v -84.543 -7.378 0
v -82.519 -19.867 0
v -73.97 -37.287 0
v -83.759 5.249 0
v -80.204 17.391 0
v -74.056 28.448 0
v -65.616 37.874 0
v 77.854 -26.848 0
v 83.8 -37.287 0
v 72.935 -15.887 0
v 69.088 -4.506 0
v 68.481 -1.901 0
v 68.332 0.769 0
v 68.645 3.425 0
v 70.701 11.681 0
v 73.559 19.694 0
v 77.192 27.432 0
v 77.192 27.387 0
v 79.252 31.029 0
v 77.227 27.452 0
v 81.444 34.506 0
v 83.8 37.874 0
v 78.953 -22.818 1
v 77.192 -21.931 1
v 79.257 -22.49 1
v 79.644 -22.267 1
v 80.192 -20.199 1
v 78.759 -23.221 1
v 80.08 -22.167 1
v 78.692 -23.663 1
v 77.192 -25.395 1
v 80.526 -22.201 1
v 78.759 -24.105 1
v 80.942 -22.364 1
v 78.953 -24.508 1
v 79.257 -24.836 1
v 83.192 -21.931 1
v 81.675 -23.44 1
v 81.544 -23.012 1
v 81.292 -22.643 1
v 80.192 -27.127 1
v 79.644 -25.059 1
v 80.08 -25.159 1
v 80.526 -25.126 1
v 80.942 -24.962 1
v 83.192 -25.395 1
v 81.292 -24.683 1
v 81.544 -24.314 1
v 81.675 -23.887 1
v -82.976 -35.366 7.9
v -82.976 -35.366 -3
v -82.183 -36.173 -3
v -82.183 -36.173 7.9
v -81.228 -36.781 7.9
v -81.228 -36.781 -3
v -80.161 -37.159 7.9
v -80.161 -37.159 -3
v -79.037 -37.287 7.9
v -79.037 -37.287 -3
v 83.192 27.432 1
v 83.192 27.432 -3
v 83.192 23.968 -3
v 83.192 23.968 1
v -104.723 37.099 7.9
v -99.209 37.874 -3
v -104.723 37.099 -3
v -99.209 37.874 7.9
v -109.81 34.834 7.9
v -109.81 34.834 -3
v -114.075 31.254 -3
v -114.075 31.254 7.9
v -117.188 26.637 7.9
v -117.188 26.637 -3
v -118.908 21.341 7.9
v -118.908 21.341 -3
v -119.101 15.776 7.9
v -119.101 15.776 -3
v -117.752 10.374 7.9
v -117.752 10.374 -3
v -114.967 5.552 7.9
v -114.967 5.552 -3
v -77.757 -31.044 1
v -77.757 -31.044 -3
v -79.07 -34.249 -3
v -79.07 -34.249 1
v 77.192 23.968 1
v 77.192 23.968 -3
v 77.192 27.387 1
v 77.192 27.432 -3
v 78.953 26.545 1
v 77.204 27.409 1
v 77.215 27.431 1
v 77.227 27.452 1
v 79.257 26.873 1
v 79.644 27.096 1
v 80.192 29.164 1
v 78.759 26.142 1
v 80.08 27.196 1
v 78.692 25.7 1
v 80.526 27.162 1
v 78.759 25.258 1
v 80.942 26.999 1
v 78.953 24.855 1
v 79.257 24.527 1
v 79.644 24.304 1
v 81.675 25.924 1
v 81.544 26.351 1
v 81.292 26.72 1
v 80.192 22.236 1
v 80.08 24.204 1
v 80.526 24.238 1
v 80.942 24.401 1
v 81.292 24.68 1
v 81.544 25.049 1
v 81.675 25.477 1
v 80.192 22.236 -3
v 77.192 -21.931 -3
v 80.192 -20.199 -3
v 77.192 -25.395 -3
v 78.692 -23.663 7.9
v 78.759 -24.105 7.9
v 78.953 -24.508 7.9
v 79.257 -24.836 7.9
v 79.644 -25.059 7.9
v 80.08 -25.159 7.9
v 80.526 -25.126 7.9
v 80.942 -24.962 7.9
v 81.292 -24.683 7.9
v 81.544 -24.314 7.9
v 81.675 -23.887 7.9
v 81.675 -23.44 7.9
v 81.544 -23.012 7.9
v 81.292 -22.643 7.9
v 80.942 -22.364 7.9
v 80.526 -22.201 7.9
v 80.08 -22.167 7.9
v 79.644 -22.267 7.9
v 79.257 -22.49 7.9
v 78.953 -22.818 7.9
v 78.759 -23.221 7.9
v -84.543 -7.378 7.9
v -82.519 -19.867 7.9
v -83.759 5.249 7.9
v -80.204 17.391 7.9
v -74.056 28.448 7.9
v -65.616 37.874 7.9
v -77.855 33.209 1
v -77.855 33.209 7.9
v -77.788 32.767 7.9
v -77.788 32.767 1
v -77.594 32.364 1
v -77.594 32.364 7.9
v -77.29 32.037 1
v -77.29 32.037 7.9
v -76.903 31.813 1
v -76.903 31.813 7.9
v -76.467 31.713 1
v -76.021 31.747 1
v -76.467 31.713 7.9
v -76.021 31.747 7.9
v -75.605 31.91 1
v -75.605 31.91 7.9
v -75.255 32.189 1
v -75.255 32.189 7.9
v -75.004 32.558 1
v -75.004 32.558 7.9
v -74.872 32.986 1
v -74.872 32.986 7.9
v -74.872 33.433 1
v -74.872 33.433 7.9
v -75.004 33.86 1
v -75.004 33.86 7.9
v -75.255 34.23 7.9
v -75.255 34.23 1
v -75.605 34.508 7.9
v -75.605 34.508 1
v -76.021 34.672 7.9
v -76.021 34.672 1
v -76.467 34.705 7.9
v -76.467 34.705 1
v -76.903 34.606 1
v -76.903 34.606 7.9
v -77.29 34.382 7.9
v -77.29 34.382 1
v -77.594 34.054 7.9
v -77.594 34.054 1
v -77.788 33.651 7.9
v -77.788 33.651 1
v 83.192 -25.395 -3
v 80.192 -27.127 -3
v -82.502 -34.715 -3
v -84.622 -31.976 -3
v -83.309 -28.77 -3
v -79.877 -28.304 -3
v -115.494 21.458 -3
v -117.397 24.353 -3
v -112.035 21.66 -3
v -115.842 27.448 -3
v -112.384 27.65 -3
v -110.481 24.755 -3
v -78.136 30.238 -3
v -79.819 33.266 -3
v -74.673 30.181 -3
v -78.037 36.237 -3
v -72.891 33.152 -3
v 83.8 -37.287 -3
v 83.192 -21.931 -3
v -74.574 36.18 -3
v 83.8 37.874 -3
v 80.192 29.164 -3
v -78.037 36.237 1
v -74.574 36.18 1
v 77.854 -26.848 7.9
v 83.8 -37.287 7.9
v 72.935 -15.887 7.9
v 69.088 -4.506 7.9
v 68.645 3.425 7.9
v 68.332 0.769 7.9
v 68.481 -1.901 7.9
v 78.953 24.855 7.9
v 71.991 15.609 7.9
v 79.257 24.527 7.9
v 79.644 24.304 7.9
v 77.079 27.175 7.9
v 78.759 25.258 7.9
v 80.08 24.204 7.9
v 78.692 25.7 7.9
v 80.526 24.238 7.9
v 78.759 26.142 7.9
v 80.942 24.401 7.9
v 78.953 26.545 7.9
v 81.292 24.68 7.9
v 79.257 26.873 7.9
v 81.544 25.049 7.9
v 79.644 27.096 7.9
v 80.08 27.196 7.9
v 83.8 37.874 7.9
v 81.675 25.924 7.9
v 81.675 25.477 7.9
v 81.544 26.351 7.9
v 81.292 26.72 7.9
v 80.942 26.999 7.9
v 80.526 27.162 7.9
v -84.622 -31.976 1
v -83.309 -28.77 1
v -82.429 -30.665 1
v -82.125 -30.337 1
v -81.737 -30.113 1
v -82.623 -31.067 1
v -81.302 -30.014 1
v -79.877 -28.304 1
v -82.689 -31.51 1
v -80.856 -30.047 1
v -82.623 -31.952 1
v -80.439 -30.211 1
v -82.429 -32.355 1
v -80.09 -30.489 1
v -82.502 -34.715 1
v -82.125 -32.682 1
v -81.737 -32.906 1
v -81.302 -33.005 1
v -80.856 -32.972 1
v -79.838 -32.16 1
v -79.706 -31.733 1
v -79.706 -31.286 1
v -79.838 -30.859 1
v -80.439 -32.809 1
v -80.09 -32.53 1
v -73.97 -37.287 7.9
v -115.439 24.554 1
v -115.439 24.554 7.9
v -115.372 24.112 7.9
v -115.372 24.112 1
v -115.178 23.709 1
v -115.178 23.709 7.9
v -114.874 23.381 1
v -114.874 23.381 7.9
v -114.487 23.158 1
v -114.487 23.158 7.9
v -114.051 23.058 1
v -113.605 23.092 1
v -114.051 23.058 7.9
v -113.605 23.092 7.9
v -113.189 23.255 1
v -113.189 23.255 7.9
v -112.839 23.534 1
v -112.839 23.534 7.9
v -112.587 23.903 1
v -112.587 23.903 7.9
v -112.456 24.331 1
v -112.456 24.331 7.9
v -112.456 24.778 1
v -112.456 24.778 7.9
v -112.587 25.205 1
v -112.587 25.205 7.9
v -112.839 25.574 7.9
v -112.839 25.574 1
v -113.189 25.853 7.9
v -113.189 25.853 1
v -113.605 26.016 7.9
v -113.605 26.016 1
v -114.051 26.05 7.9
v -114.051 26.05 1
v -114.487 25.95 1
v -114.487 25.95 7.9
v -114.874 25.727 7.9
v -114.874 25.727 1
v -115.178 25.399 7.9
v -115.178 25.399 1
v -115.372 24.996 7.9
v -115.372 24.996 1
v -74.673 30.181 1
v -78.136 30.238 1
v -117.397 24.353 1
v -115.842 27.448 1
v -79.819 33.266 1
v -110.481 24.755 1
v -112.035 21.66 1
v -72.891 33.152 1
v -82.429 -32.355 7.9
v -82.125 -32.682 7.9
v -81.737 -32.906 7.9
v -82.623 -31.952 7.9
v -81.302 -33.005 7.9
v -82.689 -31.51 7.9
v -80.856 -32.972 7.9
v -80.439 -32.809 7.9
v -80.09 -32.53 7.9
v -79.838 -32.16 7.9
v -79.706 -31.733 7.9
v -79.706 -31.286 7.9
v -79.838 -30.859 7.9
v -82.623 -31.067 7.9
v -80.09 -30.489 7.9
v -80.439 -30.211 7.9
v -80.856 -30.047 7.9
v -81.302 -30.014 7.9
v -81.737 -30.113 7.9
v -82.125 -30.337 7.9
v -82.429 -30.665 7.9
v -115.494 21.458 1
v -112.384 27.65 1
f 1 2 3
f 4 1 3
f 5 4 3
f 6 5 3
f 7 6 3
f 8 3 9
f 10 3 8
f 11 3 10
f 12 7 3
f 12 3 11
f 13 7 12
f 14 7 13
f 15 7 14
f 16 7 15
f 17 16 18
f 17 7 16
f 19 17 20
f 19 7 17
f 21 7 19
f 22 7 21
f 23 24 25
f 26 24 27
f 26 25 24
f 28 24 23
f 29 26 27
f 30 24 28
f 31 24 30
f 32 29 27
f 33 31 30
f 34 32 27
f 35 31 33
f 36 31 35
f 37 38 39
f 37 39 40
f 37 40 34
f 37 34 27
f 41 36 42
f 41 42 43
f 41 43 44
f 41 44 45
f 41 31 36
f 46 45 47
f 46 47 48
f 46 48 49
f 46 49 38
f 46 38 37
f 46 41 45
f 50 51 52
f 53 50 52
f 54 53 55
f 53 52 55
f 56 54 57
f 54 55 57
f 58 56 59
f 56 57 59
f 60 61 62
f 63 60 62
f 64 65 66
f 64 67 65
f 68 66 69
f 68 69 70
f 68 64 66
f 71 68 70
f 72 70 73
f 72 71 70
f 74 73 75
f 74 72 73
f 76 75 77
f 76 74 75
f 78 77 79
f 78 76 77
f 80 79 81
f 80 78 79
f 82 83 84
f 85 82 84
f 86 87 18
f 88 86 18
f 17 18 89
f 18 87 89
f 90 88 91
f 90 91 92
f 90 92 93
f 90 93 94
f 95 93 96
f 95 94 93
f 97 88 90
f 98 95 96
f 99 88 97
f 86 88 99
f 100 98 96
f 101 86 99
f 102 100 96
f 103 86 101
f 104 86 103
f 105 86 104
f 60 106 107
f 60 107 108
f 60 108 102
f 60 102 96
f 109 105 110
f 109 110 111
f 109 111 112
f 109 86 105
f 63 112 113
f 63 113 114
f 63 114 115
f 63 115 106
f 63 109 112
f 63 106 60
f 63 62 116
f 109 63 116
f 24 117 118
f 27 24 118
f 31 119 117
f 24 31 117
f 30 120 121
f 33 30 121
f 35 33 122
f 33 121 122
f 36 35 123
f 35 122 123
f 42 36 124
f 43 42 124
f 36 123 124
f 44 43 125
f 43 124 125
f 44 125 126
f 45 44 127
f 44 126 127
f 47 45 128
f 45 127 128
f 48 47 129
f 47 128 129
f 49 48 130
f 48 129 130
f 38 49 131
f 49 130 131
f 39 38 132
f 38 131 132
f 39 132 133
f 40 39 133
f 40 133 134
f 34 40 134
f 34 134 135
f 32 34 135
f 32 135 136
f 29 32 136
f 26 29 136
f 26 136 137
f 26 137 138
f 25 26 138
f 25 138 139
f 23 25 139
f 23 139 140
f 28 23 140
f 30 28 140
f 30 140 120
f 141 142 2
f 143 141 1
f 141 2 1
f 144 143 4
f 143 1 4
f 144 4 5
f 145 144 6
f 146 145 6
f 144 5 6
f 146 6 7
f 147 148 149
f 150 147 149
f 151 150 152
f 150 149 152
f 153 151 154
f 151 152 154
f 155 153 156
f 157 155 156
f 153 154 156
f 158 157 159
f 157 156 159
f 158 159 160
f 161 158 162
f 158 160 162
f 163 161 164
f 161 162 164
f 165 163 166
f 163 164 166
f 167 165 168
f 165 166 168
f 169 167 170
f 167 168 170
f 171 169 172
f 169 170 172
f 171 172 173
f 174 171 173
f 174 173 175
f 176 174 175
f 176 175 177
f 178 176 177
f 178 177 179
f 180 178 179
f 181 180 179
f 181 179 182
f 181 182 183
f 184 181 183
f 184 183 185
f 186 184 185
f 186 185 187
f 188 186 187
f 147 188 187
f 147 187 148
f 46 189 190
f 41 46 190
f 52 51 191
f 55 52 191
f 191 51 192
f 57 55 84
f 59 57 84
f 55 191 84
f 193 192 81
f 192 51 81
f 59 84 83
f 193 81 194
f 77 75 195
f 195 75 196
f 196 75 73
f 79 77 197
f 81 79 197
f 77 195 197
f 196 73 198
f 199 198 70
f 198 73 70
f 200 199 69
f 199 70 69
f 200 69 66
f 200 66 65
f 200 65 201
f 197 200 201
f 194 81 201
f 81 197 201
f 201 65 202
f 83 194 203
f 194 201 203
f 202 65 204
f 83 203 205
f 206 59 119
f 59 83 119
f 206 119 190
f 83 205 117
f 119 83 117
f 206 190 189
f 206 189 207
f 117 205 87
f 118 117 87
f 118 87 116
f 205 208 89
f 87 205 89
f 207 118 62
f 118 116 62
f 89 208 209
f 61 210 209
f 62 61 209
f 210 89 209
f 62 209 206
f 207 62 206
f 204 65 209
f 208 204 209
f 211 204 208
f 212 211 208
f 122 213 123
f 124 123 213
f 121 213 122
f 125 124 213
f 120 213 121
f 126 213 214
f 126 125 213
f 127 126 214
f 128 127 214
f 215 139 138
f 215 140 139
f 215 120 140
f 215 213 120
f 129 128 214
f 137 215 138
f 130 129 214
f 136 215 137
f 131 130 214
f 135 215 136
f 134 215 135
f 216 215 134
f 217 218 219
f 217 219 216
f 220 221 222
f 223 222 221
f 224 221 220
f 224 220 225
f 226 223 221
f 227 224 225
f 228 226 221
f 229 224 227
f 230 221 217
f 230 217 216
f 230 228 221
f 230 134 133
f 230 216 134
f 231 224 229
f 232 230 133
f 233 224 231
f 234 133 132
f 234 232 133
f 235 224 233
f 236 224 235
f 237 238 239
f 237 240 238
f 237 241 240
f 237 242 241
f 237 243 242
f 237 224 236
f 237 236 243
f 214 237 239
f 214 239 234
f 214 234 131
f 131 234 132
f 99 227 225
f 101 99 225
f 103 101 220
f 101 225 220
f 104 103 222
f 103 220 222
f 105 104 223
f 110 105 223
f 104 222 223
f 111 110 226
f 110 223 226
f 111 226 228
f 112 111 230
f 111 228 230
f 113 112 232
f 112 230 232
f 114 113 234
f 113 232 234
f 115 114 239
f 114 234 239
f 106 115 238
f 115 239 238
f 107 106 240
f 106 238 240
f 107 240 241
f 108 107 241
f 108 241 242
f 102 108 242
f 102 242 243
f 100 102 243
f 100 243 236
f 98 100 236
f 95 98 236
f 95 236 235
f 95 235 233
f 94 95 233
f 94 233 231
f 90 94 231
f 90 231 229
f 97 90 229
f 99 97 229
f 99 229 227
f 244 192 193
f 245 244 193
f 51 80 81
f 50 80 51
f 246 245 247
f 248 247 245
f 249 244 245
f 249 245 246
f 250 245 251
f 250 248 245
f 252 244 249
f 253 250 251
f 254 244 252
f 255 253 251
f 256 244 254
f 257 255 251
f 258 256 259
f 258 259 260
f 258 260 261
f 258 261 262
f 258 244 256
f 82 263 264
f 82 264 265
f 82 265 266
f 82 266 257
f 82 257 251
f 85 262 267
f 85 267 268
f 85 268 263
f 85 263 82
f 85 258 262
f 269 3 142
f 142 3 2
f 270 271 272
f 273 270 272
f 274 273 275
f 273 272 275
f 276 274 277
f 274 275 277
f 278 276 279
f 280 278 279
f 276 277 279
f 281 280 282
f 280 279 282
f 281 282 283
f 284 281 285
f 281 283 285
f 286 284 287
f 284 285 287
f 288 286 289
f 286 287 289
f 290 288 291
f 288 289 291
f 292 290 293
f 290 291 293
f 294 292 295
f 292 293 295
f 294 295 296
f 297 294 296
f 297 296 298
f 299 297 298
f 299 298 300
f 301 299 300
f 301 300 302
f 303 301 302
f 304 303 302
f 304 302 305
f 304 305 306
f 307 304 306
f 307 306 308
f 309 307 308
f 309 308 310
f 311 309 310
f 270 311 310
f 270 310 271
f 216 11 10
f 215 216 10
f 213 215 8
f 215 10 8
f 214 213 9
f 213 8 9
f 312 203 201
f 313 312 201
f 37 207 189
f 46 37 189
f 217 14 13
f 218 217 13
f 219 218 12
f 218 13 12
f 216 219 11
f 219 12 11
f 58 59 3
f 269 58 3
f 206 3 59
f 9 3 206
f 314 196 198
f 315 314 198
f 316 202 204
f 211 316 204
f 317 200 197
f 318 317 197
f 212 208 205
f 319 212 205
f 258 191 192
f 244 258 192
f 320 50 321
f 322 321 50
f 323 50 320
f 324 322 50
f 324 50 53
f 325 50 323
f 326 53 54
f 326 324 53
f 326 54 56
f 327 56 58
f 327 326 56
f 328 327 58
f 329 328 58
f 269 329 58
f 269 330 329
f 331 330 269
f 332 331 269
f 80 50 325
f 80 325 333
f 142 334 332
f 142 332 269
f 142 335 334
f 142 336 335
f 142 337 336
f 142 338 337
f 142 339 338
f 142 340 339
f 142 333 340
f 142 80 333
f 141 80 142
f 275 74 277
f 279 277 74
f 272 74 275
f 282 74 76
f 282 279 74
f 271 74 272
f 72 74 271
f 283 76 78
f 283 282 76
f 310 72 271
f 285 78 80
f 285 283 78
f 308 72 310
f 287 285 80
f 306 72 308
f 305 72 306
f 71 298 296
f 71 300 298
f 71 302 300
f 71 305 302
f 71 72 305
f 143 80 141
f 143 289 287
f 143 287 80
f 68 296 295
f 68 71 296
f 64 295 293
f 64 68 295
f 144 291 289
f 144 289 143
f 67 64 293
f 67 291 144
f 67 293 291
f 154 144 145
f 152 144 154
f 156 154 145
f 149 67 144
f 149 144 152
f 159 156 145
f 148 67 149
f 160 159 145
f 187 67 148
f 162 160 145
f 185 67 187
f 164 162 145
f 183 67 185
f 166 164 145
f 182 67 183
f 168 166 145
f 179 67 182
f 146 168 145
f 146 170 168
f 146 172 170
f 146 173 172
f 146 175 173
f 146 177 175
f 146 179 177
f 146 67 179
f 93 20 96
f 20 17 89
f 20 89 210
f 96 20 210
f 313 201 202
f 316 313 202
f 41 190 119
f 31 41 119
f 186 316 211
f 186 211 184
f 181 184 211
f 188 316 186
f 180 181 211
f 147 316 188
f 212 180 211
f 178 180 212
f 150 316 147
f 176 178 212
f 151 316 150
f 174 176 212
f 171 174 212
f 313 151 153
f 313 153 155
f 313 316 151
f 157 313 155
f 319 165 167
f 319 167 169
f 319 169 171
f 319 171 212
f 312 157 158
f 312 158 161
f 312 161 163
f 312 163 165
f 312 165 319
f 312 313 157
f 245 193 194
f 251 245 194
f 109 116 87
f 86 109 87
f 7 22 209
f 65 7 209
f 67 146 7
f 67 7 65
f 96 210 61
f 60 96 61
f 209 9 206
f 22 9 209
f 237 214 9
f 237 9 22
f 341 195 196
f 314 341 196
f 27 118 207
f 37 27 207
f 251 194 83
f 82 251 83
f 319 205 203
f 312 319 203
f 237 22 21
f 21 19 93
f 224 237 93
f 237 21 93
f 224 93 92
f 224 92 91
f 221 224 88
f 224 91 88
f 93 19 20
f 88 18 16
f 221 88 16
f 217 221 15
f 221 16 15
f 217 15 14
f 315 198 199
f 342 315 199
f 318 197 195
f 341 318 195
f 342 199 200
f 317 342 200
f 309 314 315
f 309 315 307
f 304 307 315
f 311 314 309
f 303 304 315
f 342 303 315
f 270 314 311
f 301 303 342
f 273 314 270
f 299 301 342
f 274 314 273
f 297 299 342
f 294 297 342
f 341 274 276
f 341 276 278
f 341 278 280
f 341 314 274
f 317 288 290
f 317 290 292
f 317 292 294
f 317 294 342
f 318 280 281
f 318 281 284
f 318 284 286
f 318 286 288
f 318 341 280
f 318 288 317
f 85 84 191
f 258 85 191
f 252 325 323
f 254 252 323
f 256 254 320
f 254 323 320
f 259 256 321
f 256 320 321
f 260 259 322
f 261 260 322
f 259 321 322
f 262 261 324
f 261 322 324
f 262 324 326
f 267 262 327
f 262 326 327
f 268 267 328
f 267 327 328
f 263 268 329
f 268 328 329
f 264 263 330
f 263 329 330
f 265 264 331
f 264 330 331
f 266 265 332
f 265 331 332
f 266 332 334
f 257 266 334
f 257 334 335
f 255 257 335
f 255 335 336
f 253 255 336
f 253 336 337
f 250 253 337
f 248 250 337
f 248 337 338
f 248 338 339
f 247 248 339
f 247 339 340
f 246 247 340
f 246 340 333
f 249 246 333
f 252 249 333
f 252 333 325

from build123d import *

# Parameters (mm, degrees)
F2_DEPTH  = 3
F3_DEPTH  = 7.9
F4_DEPTH  = 7.9
F5_DEPTH  = 3
F6_R      = 5
F6_2_R    = 5
F9_D      = 3
F10_DEPTH = 4
F11_DEPTH = 4


with BuildPart() as f2:
    # F0 (on Top) → F2 (new body)
    with BuildSketch(Plane.XY):
        with BuildLine():
            ThreePointArc((68.6448413014, 3.4252903424), (74.3230858808, 21.4851908555), (83.8, 37.8739237785))
            Line((83.8, 37.8739237785), (-65.6162592679, 37.8739237785))
            ThreePointArc((-65.6162592679, 37.8739237785), (-82.3199649398, 11.4193737584), (-82.519158721, -19.8666825891))
            Line((-82.519158721, -19.8666825891), (-73.9695476283, -37.2867286205))
            Line((-73.9695476283, -37.2867286205), (83.8, -37.2867286205))
            ThreePointArc((83.8, -37.2867286205), (75.2631412951, -21.4263167299), (69.0877699379, -4.5060504646))
            ThreePointArc((69.0877699379, -4.5060504646), (68.3487291916, -0.5692843065), (68.6448413014, 3.4252903424))
        make_face()
    extrude(amount=-F2_DEPTH)


with BuildPart() as f3:
    # F0 (on Top) → F3 (new body)
    with BuildSketch(Plane.XY):
        with BuildLine():
            ThreePointArc((-82.519158721, -19.8666825891), (-82.3199649398, 11.4193737584), (-65.6162592679, 37.8739237785))
            Line((-65.6162592679, 37.8739237785), (-99.2088739193, 37.8739237785))
            ThreePointArc((-99.2088739193, 37.8739237785), (-117.1879721114, 26.6373104948), (-114.9666717313, 5.5523567478))
            Line((-114.9666717313, 5.5523567478), (-81.4747432756, -37.2867286205))
            Line((-81.4747432756, -37.2867286205), (-73.9695476283, -37.2867286205))
            Line((-73.9695476283, -37.2867286205), (-82.519158721, -19.8666825891))
        make_face()
    extrude(amount=F3_DEPTH)


with BuildPart() as f4:
    # F0 (on Top) → F4 (new body)
    with BuildSketch(Plane.XY):
        with BuildLine():
            Line((83.8, -37.2867286205), (83.8, 37.8739237785))
            ThreePointArc((83.8, 37.8739237785), (74.3230858808, 21.4851908555), (68.6448413014, 3.4252903424))
            ThreePointArc((68.6448413014, 3.4252903424), (68.3487291916, -0.5692843065), (69.0877699379, -4.5060504646))
            ThreePointArc((69.0877699379, -4.5060504646), (75.2631412951, -21.4263167299), (83.8, -37.2867286205))
        make_face()
    extrude(amount=F4_DEPTH)


with BuildPart() as f5:
    # F5 (new): a face of the model
    f5_faces = [f3.part.faces().sort_by_distance(p)[0] for p in [
        (-94.9777366474, 10.3847598955, 0),
    ]]
    extrude(f5_faces, amount=F5_DEPTH)

    # F6#2
    f6_2_edges = [f5.edges().sort_by_distance(p)[0] for p in [
        (-81.474743, -37.286729, -1.5),
    ]]
    fillet(f6_2_edges, radius=F6_2_R)


with BuildPart() as f5b:
    # F5#2 (new): a face of the model
    f5_2_faces = [f4.part.faces().sort_by_distance(p)[0] for p in [
        (77.989714527, 0.7740894227, 0),
    ]]
    extrude(f5_2_faces, amount=F5_DEPTH)


with BuildPart() as f3_1:
    add(f3.part)

    # F6
    f6_edges = [f3_1.edges().sort_by_distance(p)[0] for p in [
        (-81.474743, -37.286729, 3.95),
    ]]
    fillet(f6_edges, radius=F6_R)


with BuildPart() as f2_1:
    add(f2.part)

    # F7: union F3, F4, F5, F5b
    add(f3_1.part)
    add(f4.part)
    add(f5.part)
    add(f5b.part)

    # F9 (through all)
    with Locations(Plane(origin=(0, 0, -3), x_dir=(1, 0, 0), z_dir=(0, 0, -1))):
        with Locations((-81.1894536018, 31.5095931292), (-113.9387488365, -24.5540793985), (-76.3550326228, -33.2092493773), (80.1921039701, 23.663148284), (80.1921039701, -25.700064376)):
            Hole(F9_D / 2)

    # F8 (on face) → F10 (cut)
    with BuildSketch(Plane(origin=(0, 0, -3), x_dir=(1, 0, 0), z_dir=(0, 0, -1))):
        Polygon((-74.5737203647, -36.1802637897), (-72.8914025376, -33.1520949158), (-74.6727147957, -30.1810805034), (-78.136344881, -30.2382349648), (-79.8186627081, -33.2664038387), (-78.0373504499, -36.2374182511), align=None)
        Polygon((83.1921039701, 21.9310974764), (83.1921039701, 25.3951990915), (80.1921039701, 27.1272498991), (77.1921039701, 25.3951990915), (77.1921039701, 21.9310974764), (80.1921039701, 20.1990466688), align=None)
        Polygon((83.1921039701, -27.4321151836), (83.1921039701, -23.9680135684), (80.1921039701, -22.2359627609), (77.1921039701, -23.9680135684), (77.1921039701, -27.4321151836), (80.1921039701, -29.1641659911), align=None)
        Polygon((-79.8767595984, 28.3038429122), (-77.7568454741, 31.043544375), (-79.0695394775, 34.249294592), (-82.5021476052, 34.7153433461), (-84.6220617296, 31.9756418833), (-83.3093677262, 28.7698916664), align=None)
        Polygon((-110.4805015339, -24.7553890954), (-112.0352858737, -21.6598042304), (-115.4935331763, -21.4584945334), (-117.3969961391, -24.3527697016), (-115.8422117994, -27.4483545667), (-112.3839644968, -27.6496642636), align=None)
    extrude(amount=-F10_DEPTH, mode=Mode.SUBTRACT)

    # F8 (on face) → F11 (cut)
    with BuildSketch(Plane(origin=(0, 0, -3), x_dir=(1, 0, 0), z_dir=(0, 0, -1))):
        Polygon((-74.5737203647, -36.1802637897), (-72.8914025376, -33.1520949158), (-74.6727147957, -30.1810805034), (-78.136344881, -30.2382349648), (-79.8186627081, -33.2664038387), (-78.0373504499, -36.2374182511), align=None)
        Polygon((83.1921039701, 21.9310974764), (83.1921039701, 25.3951990915), (80.1921039701, 27.1272498991), (77.1921039701, 25.3951990915), (77.1921039701, 21.9310974764), (80.1921039701, 20.1990466688), align=None)
        Polygon((83.1921039701, -27.4321151836), (83.1921039701, -23.9680135684), (80.1921039701, -22.2359627609), (77.1921039701, -23.9680135684), (77.1921039701, -27.4321151836), (80.1921039701, -29.1641659911), align=None)
        Polygon((-79.8767595984, 28.3038429122), (-77.7568454741, 31.043544375), (-79.0695394775, 34.249294592), (-82.5021476052, 34.7153433461), (-84.6220617296, 31.9756418833), (-83.3093677262, 28.7698916664), align=None)
        Polygon((-110.4805015339, -24.7553890954), (-112.0352858737, -21.6598042304), (-115.4935331763, -21.4584945334), (-117.3969961391, -24.3527697016), (-115.8422117994, -27.4483545667), (-112.3839644968, -27.6496642636), align=None)
    extrude(amount=-F11_DEPTH, mode=Mode.SUBTRACT)


solid = f2_1.part
